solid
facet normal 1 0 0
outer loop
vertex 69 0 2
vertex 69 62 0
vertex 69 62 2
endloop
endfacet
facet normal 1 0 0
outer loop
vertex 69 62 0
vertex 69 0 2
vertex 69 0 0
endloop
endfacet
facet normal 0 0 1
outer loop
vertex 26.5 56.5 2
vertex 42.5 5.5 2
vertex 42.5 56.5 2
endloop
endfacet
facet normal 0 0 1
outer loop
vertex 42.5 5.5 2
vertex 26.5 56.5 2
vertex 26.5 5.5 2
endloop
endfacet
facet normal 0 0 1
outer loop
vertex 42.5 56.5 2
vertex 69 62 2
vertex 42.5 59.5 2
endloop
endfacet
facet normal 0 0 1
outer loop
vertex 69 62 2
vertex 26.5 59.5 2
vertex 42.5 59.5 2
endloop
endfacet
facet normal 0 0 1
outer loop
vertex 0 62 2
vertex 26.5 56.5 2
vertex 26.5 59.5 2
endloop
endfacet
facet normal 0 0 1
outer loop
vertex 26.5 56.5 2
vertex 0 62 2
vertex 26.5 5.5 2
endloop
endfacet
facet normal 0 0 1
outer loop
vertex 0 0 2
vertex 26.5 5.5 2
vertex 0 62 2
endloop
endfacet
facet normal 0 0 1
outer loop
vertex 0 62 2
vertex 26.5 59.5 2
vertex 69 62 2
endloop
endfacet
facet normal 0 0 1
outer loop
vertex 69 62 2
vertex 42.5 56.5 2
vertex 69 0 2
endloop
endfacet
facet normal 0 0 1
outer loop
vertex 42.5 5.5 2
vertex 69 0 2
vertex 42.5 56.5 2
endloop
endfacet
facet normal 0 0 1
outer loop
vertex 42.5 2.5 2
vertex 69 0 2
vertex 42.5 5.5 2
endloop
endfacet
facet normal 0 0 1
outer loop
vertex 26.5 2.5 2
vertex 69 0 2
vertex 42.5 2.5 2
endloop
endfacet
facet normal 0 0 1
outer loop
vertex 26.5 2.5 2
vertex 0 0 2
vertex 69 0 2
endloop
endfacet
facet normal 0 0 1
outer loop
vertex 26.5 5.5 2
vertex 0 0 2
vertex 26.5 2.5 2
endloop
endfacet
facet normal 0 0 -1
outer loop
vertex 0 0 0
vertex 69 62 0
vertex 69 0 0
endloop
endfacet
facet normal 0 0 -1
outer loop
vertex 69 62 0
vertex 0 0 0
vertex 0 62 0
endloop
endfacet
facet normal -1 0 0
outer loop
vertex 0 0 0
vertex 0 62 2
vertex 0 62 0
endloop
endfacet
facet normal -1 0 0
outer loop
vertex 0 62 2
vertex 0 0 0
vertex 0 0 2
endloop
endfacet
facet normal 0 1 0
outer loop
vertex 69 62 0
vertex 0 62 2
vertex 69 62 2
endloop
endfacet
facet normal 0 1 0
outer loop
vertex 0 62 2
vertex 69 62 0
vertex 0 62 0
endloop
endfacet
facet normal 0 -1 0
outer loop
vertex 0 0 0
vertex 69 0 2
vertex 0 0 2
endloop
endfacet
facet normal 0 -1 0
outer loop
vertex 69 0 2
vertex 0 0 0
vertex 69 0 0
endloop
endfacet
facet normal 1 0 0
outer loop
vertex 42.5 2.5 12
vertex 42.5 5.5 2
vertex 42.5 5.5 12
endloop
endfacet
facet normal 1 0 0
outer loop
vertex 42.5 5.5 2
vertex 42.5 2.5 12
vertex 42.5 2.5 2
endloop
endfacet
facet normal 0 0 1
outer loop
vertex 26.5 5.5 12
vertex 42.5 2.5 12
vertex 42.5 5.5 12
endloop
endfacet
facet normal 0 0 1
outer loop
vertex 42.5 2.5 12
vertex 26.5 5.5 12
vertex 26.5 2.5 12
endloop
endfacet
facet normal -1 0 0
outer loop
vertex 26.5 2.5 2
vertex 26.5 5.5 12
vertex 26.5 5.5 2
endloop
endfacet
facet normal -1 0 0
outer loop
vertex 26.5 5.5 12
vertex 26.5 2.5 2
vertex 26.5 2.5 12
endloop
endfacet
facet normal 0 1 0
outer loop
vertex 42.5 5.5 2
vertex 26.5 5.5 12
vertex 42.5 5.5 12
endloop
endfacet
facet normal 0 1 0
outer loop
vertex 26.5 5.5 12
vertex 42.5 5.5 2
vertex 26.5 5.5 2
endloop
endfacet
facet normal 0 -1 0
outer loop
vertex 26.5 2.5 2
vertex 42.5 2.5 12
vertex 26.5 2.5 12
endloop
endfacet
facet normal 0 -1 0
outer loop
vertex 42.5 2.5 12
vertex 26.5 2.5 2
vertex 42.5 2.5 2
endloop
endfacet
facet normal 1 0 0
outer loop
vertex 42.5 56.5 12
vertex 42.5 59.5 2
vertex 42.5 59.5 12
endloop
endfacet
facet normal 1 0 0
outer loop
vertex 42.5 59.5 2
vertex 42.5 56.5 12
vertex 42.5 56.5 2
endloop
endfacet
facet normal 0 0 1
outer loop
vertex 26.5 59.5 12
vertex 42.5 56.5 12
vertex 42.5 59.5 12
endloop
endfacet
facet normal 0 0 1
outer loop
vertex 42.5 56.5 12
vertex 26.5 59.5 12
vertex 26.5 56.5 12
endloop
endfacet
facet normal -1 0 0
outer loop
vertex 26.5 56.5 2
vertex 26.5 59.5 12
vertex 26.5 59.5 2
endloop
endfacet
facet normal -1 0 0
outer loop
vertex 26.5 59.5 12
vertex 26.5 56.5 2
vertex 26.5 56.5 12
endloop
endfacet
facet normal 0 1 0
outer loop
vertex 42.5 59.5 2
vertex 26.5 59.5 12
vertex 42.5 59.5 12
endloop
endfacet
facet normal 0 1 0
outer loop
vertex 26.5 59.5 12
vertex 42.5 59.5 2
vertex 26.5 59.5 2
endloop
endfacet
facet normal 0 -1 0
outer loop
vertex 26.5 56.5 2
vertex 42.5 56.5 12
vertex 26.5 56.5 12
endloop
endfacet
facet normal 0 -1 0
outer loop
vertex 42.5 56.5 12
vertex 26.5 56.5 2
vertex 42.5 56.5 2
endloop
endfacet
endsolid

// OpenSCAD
l=69;
w=62;
t=2;
g=2.5;
cube([l,w,t]);
translate([l/2-8,g,0]) cube([16,t+1,12]);
translate([l/2-8,w-g-t-1,0]) cube([16,t+1,12]);
